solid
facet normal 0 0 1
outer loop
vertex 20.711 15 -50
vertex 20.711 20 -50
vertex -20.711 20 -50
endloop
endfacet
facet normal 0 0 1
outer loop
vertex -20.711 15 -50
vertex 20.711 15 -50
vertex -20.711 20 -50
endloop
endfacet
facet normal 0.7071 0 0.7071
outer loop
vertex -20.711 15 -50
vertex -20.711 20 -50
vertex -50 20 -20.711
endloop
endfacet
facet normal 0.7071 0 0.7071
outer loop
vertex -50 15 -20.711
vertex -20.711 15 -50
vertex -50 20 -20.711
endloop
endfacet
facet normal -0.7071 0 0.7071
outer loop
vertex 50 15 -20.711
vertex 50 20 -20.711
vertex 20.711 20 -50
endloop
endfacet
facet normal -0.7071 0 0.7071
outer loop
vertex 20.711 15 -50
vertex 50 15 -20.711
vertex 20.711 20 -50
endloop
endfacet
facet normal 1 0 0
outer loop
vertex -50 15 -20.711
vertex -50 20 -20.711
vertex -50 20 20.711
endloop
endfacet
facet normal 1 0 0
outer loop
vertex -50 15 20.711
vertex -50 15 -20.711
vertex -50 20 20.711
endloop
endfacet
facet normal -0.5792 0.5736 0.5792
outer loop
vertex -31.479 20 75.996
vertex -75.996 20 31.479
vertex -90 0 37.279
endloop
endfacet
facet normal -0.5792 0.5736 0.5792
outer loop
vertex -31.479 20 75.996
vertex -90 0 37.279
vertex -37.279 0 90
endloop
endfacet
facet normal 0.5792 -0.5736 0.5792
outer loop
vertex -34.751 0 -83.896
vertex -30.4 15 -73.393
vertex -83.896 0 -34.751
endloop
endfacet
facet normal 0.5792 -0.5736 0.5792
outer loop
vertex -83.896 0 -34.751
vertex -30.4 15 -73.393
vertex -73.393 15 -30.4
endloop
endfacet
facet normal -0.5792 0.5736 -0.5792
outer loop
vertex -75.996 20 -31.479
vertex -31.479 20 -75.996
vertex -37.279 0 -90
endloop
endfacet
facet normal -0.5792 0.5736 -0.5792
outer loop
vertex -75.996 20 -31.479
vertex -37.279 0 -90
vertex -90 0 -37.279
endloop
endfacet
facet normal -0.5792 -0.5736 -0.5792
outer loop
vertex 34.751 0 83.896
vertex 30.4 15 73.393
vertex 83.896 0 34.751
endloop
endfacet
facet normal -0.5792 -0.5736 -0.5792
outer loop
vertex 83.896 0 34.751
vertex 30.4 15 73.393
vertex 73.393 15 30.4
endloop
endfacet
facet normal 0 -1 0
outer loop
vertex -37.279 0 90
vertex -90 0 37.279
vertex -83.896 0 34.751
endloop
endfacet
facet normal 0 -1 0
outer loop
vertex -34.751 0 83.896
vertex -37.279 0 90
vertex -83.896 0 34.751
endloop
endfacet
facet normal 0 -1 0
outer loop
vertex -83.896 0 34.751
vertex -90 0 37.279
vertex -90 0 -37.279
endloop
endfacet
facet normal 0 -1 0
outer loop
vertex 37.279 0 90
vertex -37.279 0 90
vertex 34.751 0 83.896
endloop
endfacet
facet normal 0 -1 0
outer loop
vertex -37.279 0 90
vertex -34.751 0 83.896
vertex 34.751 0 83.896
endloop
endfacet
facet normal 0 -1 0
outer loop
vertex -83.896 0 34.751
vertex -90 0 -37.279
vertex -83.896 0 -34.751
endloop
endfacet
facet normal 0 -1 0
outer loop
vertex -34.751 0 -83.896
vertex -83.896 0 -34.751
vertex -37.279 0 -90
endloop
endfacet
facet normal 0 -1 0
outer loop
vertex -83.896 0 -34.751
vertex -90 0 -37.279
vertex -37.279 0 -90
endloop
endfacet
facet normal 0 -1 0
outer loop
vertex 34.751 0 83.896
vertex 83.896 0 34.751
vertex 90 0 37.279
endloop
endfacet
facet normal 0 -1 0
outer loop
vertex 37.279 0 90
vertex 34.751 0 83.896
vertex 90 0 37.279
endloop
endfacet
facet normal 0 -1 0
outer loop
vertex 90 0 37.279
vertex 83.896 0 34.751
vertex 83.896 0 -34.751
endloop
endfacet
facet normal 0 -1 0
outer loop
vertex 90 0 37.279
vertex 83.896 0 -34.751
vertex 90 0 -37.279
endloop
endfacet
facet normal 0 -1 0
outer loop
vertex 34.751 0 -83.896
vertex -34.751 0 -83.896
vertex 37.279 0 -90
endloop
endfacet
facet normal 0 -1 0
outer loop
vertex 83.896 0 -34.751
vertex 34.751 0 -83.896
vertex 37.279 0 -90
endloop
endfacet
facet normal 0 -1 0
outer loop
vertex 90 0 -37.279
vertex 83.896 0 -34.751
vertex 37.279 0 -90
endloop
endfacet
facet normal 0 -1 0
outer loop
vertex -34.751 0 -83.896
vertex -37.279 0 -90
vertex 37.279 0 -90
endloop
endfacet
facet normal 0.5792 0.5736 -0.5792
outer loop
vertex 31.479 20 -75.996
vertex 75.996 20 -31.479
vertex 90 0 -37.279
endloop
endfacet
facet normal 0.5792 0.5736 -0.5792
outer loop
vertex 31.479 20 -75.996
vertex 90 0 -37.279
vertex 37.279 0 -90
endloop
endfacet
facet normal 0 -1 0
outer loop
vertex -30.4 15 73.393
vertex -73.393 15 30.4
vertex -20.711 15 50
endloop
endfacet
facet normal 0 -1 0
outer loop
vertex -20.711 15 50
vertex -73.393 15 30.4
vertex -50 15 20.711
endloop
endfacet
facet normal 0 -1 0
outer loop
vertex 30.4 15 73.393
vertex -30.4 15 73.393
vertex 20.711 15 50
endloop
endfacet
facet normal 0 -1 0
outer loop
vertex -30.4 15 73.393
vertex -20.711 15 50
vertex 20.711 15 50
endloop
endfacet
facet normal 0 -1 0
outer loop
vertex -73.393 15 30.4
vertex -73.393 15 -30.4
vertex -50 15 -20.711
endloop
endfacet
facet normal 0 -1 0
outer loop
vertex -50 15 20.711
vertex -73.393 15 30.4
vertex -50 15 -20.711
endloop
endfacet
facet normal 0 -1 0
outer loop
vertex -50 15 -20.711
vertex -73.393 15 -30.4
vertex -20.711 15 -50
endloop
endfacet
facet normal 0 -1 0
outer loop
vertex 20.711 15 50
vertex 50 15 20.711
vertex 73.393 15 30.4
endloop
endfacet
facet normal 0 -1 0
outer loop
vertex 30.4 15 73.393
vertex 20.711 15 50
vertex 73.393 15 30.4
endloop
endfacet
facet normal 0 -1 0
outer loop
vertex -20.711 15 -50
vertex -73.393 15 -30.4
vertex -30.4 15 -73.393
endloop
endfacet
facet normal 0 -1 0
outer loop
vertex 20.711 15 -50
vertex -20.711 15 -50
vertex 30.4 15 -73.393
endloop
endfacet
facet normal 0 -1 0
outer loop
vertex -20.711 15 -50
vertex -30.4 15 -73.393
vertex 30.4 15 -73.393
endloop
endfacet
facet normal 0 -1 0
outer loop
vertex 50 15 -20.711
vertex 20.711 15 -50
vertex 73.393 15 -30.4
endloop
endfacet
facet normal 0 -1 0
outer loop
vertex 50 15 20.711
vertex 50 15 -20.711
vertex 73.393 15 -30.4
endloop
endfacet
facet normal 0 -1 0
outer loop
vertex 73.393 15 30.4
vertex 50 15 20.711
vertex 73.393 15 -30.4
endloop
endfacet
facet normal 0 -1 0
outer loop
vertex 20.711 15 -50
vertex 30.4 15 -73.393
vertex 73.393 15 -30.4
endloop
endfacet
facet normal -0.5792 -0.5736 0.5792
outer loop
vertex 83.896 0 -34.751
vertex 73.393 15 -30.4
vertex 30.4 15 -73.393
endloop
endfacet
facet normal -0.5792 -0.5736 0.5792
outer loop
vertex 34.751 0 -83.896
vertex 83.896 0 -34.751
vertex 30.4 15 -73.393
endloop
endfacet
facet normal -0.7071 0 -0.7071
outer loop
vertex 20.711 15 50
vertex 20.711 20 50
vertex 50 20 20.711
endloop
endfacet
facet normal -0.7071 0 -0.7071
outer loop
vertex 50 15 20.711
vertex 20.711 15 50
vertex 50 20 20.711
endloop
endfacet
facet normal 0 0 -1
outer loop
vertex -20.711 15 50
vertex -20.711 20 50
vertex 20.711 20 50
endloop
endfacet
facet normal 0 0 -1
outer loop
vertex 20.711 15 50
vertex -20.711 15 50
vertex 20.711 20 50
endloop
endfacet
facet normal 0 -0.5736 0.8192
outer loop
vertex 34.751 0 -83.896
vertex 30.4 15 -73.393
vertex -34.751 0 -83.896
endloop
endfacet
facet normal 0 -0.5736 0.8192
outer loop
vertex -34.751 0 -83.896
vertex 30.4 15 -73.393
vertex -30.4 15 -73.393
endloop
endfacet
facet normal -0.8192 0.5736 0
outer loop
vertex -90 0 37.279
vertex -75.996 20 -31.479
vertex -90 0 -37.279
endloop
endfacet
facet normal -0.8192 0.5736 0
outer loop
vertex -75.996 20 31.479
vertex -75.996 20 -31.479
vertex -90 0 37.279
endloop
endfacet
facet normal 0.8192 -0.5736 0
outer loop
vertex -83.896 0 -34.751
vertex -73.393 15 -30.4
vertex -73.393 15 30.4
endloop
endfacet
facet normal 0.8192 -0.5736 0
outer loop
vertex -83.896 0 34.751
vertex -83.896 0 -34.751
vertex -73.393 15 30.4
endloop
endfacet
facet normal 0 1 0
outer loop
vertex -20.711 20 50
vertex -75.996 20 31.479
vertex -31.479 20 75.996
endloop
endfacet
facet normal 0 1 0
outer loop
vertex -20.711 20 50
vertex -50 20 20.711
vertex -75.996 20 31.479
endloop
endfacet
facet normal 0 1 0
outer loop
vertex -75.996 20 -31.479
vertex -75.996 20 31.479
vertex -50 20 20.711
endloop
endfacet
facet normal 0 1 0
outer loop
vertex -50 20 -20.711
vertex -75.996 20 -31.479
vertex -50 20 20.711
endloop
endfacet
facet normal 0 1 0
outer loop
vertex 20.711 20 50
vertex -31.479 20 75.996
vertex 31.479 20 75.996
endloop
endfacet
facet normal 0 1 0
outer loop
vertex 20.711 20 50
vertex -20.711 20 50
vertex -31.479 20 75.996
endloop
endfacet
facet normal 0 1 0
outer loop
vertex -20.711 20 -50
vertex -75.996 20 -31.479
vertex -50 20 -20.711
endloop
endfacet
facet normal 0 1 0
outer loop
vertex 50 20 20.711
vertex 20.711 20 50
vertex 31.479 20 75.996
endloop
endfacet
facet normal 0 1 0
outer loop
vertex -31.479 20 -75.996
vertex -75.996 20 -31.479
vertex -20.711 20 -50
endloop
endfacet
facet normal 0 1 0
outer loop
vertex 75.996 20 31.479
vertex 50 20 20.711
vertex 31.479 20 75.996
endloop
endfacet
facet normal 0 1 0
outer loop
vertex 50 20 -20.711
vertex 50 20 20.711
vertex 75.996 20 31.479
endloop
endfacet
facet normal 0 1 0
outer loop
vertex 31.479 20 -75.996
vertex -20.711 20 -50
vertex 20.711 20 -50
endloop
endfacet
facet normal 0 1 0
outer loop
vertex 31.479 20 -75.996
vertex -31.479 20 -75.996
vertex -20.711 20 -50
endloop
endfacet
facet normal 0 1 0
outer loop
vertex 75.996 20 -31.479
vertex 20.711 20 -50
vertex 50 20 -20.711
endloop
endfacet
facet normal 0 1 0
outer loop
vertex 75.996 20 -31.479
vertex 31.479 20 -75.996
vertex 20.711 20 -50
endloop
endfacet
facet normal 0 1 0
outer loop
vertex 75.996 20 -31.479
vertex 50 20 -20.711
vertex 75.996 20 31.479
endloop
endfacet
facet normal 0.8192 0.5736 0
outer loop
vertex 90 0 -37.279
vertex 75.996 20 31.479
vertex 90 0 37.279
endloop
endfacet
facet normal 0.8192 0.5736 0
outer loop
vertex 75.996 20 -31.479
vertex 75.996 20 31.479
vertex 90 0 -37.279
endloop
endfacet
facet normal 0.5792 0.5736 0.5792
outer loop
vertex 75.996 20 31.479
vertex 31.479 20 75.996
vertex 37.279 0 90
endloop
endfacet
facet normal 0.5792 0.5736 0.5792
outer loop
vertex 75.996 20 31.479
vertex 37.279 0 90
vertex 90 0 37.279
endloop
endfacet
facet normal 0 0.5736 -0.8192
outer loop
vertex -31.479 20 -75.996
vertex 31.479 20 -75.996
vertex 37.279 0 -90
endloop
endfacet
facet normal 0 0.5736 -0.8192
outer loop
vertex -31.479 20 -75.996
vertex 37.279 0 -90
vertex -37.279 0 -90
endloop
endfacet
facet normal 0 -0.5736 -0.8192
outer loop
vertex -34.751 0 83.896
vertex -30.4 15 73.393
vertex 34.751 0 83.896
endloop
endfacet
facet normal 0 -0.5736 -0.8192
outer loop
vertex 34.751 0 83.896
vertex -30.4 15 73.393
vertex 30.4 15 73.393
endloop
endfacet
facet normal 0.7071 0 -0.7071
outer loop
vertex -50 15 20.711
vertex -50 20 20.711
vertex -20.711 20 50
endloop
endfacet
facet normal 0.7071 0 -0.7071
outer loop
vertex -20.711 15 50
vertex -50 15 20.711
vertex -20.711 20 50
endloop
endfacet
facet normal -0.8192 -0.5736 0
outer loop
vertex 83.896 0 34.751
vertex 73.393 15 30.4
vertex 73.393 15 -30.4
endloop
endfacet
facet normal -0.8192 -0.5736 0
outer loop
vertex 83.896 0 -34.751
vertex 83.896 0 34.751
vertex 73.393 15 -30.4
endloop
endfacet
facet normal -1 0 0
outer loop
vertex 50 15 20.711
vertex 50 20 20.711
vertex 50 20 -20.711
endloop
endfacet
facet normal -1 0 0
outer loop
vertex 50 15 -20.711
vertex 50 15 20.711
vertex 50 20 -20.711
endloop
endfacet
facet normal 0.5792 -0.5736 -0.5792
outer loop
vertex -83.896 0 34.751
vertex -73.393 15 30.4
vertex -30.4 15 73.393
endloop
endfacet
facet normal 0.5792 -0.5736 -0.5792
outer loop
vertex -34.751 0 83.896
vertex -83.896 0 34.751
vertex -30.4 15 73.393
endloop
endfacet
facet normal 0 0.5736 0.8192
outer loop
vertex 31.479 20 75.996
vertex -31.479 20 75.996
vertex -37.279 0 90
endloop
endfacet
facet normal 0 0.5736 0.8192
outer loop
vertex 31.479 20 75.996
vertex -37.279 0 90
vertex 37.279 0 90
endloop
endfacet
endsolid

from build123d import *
from OCP.BRepFilletAPI import BRepFilletAPI_MakeChamfer

# Parameters (mm, degrees)
BOSS_EXTRUDE1_DEPTH = 20
CHAMFER1_SIZE       = 20
CHAMFER1_SIZE_2     = 14.004150764
SHELL1_DEPTH        = 15
SHELL1_DRAFT        = 35
CUT_EXTRUDE2_DEPTH  = 129.840987267


# Read off the part's stored shape, not the designer's step: Shell1
with BuildPart() as part:
    # Sketch1 → Boss-Extrude1 (new body)
    with BuildSketch(Plane(origin=(0, 0, 0), x_dir=(1, 0, 0), z_dir=(0, 1, 0))):
        Polygon((90, -37.279220614), (90, 37.279220614), (37.279220614, 90), (-37.279220614, 90), (-90, 37.279220614), (-90, -37.279220614), (-37.279220614, -90), (37.279220614, -90), align=None)
    extrude(amount=BOSS_EXTRUDE1_DEPTH)

    # Chamfer1
    chamfer1_edges_1 = [part.edges().sort_by_distance(p)[0] for p in [
        (0, 20, 90),
    ]]
    chamfer1_side_1 = [part.faces().sort_by_distance(p)[0] for p in [
        (0, 19.719916985, 90),
    ]]
    chamfer1_edges_2 = [part.edges().sort_by_distance(p)[0] for p in [
        (-63.639610307, 20, 63.639610307),
    ]]
    chamfer1_side_2 = [part.faces().sort_by_distance(p)[0] for p in [
        (-63.639610307, 19.719916985, 63.639610307),
    ]]
    chamfer1_edges_3 = [part.edges().sort_by_distance(p)[0] for p in [
        (-90, 20, 0),
    ]]
    chamfer1_side_3 = [part.faces().sort_by_distance(p)[0] for p in [
        (-90, 19.719916985, 0),
    ]]
    chamfer1_edges_4 = [part.edges().sort_by_distance(p)[0] for p in [
        (-63.639610307, 20, -63.639610307),
    ]]
    chamfer1_side_4 = [part.faces().sort_by_distance(p)[0] for p in [
        (-63.639610307, 19.719916985, -63.639610307),
    ]]
    chamfer1_edges_5 = [part.edges().sort_by_distance(p)[0] for p in [
        (0, 20, -90),
    ]]
    chamfer1_side_5 = [part.faces().sort_by_distance(p)[0] for p in [
        (0, 19.719916985, -90),
    ]]
    chamfer1_edges_6 = [part.edges().sort_by_distance(p)[0] for p in [
        (63.639610307, 20, -63.639610307),
    ]]
    chamfer1_side_6 = [part.faces().sort_by_distance(p)[0] for p in [
        (63.639610307, 19.719916985, -63.639610307),
    ]]
    chamfer1_edges_7 = [part.edges().sort_by_distance(p)[0] for p in [
        (90, 20, 0),
    ]]
    chamfer1_side_7 = [part.faces().sort_by_distance(p)[0] for p in [
        (90, 19.719916985, 0),
    ]]
    chamfer1_edges_8 = [part.edges().sort_by_distance(p)[0] for p in [
        (63.639610307, 20, 63.639610307),
    ]]
    chamfer1_side_8 = [part.faces().sort_by_distance(p)[0] for p in [
        (63.639610307, 19.719916985, 63.639610307),
    ]]
    chamfer1 = BRepFilletAPI_MakeChamfer(part.part.solid().wrapped)
    for e in chamfer1_edges_1:
        chamfer1.Add(CHAMFER1_SIZE - 0.0001, CHAMFER1_SIZE_2 - 0.0001, e.wrapped, chamfer1_side_1[0].wrapped)
    for e in chamfer1_edges_2:
        chamfer1.Add(CHAMFER1_SIZE - 0.0001, CHAMFER1_SIZE_2 - 0.0001, e.wrapped, chamfer1_side_2[0].wrapped)
    for e in chamfer1_edges_3:
        chamfer1.Add(CHAMFER1_SIZE - 0.0001, CHAMFER1_SIZE_2 - 0.0001, e.wrapped, chamfer1_side_3[0].wrapped)
    for e in chamfer1_edges_4:
        chamfer1.Add(CHAMFER1_SIZE - 0.0001, CHAMFER1_SIZE_2 - 0.0001, e.wrapped, chamfer1_side_4[0].wrapped)
    for e in chamfer1_edges_5:
        chamfer1.Add(CHAMFER1_SIZE - 0.0001, CHAMFER1_SIZE_2 - 0.0001, e.wrapped, chamfer1_side_5[0].wrapped)
    for e in chamfer1_edges_6:
        chamfer1.Add(CHAMFER1_SIZE - 0.0001, CHAMFER1_SIZE_2 - 0.0001, e.wrapped, chamfer1_side_6[0].wrapped)
    for e in chamfer1_edges_7:
        chamfer1.Add(CHAMFER1_SIZE - 0.0001, CHAMFER1_SIZE_2 - 0.0001, e.wrapped, chamfer1_side_7[0].wrapped)
    for e in chamfer1_edges_8:
        chamfer1.Add(CHAMFER1_SIZE - 0.0001, CHAMFER1_SIZE_2 - 0.0001, e.wrapped, chamfer1_side_8[0].wrapped)
    add(Compound.cast(chamfer1.Shape()), mode=Mode.REPLACE)  # a hair under: the kernel refuses the full size


with BuildPart() as shell1_tool:
    # Shell1 outline → Shell1 (with draft: the straight prism first)
    with BuildSketch(Plane(origin=(0, 15, 0), x_dir=(1, 0, 0), z_dir=(0, 1, 0))):
        Polygon((-30.400381775, -73.393013983), (30.400381775, -73.393013983), (73.393013983, -30.400381775), (73.393013983, 30.400381775), (30.400381775, 73.393013983), (-30.400381775, 73.393013983), (-73.393013983, 30.400381775), (-73.393013983, -30.400381775), align=None)
    extrude(amount=-SHELL1_DEPTH)
    # Shell1: the draft: its side faces are tilted about the plane it starts from
    shell1_sides = [shell1_tool.faces().sort_by_distance(p)[0] for p in [
        (0, 7.5, 73.393013983),
        (51.896697879, 7.5, 51.896697879),
        (73.393013983, 7.5, 0),
        (51.896697879, 7.5, -51.896697879),
        (0, 7.5, -73.393013983),
        (-51.896697879, 7.5, -51.896697879),
        (-73.393013983, 7.5, 0),
        (-51.896697879, 7.5, 51.896697879),
    ]]
    draft(shell1_sides, Plane(origin=(0, 15, 0), x_dir=(1, 0, 0), z_dir=(0, 1, 0)), SHELL1_DRAFT)


with BuildPart() as part_1:
    add(part.part)

    # Shell1: cut by shell1_tool
    add(shell1_tool.part, mode=Mode.SUBTRACT)

    # Sketch2 → Cut-Extrude2 (cut, through all)
    with BuildSketch(Plane(origin=(0, 20, 0), x_dir=(1, 0, 0), z_dir=(0, 1, 0))):
        Polygon((20.710678119, 50), (-20.710678119, 50), (-50, 20.710678119), (-50, -20.710678119), (-20.710678119, -50), (20.710678119, -50), (50, -20.710678119), (50, 20.710678119), align=None)
    extrude(amount=-CUT_EXTRUDE2_DEPTH, mode=Mode.SUBTRACT)


solid = part_1.part
